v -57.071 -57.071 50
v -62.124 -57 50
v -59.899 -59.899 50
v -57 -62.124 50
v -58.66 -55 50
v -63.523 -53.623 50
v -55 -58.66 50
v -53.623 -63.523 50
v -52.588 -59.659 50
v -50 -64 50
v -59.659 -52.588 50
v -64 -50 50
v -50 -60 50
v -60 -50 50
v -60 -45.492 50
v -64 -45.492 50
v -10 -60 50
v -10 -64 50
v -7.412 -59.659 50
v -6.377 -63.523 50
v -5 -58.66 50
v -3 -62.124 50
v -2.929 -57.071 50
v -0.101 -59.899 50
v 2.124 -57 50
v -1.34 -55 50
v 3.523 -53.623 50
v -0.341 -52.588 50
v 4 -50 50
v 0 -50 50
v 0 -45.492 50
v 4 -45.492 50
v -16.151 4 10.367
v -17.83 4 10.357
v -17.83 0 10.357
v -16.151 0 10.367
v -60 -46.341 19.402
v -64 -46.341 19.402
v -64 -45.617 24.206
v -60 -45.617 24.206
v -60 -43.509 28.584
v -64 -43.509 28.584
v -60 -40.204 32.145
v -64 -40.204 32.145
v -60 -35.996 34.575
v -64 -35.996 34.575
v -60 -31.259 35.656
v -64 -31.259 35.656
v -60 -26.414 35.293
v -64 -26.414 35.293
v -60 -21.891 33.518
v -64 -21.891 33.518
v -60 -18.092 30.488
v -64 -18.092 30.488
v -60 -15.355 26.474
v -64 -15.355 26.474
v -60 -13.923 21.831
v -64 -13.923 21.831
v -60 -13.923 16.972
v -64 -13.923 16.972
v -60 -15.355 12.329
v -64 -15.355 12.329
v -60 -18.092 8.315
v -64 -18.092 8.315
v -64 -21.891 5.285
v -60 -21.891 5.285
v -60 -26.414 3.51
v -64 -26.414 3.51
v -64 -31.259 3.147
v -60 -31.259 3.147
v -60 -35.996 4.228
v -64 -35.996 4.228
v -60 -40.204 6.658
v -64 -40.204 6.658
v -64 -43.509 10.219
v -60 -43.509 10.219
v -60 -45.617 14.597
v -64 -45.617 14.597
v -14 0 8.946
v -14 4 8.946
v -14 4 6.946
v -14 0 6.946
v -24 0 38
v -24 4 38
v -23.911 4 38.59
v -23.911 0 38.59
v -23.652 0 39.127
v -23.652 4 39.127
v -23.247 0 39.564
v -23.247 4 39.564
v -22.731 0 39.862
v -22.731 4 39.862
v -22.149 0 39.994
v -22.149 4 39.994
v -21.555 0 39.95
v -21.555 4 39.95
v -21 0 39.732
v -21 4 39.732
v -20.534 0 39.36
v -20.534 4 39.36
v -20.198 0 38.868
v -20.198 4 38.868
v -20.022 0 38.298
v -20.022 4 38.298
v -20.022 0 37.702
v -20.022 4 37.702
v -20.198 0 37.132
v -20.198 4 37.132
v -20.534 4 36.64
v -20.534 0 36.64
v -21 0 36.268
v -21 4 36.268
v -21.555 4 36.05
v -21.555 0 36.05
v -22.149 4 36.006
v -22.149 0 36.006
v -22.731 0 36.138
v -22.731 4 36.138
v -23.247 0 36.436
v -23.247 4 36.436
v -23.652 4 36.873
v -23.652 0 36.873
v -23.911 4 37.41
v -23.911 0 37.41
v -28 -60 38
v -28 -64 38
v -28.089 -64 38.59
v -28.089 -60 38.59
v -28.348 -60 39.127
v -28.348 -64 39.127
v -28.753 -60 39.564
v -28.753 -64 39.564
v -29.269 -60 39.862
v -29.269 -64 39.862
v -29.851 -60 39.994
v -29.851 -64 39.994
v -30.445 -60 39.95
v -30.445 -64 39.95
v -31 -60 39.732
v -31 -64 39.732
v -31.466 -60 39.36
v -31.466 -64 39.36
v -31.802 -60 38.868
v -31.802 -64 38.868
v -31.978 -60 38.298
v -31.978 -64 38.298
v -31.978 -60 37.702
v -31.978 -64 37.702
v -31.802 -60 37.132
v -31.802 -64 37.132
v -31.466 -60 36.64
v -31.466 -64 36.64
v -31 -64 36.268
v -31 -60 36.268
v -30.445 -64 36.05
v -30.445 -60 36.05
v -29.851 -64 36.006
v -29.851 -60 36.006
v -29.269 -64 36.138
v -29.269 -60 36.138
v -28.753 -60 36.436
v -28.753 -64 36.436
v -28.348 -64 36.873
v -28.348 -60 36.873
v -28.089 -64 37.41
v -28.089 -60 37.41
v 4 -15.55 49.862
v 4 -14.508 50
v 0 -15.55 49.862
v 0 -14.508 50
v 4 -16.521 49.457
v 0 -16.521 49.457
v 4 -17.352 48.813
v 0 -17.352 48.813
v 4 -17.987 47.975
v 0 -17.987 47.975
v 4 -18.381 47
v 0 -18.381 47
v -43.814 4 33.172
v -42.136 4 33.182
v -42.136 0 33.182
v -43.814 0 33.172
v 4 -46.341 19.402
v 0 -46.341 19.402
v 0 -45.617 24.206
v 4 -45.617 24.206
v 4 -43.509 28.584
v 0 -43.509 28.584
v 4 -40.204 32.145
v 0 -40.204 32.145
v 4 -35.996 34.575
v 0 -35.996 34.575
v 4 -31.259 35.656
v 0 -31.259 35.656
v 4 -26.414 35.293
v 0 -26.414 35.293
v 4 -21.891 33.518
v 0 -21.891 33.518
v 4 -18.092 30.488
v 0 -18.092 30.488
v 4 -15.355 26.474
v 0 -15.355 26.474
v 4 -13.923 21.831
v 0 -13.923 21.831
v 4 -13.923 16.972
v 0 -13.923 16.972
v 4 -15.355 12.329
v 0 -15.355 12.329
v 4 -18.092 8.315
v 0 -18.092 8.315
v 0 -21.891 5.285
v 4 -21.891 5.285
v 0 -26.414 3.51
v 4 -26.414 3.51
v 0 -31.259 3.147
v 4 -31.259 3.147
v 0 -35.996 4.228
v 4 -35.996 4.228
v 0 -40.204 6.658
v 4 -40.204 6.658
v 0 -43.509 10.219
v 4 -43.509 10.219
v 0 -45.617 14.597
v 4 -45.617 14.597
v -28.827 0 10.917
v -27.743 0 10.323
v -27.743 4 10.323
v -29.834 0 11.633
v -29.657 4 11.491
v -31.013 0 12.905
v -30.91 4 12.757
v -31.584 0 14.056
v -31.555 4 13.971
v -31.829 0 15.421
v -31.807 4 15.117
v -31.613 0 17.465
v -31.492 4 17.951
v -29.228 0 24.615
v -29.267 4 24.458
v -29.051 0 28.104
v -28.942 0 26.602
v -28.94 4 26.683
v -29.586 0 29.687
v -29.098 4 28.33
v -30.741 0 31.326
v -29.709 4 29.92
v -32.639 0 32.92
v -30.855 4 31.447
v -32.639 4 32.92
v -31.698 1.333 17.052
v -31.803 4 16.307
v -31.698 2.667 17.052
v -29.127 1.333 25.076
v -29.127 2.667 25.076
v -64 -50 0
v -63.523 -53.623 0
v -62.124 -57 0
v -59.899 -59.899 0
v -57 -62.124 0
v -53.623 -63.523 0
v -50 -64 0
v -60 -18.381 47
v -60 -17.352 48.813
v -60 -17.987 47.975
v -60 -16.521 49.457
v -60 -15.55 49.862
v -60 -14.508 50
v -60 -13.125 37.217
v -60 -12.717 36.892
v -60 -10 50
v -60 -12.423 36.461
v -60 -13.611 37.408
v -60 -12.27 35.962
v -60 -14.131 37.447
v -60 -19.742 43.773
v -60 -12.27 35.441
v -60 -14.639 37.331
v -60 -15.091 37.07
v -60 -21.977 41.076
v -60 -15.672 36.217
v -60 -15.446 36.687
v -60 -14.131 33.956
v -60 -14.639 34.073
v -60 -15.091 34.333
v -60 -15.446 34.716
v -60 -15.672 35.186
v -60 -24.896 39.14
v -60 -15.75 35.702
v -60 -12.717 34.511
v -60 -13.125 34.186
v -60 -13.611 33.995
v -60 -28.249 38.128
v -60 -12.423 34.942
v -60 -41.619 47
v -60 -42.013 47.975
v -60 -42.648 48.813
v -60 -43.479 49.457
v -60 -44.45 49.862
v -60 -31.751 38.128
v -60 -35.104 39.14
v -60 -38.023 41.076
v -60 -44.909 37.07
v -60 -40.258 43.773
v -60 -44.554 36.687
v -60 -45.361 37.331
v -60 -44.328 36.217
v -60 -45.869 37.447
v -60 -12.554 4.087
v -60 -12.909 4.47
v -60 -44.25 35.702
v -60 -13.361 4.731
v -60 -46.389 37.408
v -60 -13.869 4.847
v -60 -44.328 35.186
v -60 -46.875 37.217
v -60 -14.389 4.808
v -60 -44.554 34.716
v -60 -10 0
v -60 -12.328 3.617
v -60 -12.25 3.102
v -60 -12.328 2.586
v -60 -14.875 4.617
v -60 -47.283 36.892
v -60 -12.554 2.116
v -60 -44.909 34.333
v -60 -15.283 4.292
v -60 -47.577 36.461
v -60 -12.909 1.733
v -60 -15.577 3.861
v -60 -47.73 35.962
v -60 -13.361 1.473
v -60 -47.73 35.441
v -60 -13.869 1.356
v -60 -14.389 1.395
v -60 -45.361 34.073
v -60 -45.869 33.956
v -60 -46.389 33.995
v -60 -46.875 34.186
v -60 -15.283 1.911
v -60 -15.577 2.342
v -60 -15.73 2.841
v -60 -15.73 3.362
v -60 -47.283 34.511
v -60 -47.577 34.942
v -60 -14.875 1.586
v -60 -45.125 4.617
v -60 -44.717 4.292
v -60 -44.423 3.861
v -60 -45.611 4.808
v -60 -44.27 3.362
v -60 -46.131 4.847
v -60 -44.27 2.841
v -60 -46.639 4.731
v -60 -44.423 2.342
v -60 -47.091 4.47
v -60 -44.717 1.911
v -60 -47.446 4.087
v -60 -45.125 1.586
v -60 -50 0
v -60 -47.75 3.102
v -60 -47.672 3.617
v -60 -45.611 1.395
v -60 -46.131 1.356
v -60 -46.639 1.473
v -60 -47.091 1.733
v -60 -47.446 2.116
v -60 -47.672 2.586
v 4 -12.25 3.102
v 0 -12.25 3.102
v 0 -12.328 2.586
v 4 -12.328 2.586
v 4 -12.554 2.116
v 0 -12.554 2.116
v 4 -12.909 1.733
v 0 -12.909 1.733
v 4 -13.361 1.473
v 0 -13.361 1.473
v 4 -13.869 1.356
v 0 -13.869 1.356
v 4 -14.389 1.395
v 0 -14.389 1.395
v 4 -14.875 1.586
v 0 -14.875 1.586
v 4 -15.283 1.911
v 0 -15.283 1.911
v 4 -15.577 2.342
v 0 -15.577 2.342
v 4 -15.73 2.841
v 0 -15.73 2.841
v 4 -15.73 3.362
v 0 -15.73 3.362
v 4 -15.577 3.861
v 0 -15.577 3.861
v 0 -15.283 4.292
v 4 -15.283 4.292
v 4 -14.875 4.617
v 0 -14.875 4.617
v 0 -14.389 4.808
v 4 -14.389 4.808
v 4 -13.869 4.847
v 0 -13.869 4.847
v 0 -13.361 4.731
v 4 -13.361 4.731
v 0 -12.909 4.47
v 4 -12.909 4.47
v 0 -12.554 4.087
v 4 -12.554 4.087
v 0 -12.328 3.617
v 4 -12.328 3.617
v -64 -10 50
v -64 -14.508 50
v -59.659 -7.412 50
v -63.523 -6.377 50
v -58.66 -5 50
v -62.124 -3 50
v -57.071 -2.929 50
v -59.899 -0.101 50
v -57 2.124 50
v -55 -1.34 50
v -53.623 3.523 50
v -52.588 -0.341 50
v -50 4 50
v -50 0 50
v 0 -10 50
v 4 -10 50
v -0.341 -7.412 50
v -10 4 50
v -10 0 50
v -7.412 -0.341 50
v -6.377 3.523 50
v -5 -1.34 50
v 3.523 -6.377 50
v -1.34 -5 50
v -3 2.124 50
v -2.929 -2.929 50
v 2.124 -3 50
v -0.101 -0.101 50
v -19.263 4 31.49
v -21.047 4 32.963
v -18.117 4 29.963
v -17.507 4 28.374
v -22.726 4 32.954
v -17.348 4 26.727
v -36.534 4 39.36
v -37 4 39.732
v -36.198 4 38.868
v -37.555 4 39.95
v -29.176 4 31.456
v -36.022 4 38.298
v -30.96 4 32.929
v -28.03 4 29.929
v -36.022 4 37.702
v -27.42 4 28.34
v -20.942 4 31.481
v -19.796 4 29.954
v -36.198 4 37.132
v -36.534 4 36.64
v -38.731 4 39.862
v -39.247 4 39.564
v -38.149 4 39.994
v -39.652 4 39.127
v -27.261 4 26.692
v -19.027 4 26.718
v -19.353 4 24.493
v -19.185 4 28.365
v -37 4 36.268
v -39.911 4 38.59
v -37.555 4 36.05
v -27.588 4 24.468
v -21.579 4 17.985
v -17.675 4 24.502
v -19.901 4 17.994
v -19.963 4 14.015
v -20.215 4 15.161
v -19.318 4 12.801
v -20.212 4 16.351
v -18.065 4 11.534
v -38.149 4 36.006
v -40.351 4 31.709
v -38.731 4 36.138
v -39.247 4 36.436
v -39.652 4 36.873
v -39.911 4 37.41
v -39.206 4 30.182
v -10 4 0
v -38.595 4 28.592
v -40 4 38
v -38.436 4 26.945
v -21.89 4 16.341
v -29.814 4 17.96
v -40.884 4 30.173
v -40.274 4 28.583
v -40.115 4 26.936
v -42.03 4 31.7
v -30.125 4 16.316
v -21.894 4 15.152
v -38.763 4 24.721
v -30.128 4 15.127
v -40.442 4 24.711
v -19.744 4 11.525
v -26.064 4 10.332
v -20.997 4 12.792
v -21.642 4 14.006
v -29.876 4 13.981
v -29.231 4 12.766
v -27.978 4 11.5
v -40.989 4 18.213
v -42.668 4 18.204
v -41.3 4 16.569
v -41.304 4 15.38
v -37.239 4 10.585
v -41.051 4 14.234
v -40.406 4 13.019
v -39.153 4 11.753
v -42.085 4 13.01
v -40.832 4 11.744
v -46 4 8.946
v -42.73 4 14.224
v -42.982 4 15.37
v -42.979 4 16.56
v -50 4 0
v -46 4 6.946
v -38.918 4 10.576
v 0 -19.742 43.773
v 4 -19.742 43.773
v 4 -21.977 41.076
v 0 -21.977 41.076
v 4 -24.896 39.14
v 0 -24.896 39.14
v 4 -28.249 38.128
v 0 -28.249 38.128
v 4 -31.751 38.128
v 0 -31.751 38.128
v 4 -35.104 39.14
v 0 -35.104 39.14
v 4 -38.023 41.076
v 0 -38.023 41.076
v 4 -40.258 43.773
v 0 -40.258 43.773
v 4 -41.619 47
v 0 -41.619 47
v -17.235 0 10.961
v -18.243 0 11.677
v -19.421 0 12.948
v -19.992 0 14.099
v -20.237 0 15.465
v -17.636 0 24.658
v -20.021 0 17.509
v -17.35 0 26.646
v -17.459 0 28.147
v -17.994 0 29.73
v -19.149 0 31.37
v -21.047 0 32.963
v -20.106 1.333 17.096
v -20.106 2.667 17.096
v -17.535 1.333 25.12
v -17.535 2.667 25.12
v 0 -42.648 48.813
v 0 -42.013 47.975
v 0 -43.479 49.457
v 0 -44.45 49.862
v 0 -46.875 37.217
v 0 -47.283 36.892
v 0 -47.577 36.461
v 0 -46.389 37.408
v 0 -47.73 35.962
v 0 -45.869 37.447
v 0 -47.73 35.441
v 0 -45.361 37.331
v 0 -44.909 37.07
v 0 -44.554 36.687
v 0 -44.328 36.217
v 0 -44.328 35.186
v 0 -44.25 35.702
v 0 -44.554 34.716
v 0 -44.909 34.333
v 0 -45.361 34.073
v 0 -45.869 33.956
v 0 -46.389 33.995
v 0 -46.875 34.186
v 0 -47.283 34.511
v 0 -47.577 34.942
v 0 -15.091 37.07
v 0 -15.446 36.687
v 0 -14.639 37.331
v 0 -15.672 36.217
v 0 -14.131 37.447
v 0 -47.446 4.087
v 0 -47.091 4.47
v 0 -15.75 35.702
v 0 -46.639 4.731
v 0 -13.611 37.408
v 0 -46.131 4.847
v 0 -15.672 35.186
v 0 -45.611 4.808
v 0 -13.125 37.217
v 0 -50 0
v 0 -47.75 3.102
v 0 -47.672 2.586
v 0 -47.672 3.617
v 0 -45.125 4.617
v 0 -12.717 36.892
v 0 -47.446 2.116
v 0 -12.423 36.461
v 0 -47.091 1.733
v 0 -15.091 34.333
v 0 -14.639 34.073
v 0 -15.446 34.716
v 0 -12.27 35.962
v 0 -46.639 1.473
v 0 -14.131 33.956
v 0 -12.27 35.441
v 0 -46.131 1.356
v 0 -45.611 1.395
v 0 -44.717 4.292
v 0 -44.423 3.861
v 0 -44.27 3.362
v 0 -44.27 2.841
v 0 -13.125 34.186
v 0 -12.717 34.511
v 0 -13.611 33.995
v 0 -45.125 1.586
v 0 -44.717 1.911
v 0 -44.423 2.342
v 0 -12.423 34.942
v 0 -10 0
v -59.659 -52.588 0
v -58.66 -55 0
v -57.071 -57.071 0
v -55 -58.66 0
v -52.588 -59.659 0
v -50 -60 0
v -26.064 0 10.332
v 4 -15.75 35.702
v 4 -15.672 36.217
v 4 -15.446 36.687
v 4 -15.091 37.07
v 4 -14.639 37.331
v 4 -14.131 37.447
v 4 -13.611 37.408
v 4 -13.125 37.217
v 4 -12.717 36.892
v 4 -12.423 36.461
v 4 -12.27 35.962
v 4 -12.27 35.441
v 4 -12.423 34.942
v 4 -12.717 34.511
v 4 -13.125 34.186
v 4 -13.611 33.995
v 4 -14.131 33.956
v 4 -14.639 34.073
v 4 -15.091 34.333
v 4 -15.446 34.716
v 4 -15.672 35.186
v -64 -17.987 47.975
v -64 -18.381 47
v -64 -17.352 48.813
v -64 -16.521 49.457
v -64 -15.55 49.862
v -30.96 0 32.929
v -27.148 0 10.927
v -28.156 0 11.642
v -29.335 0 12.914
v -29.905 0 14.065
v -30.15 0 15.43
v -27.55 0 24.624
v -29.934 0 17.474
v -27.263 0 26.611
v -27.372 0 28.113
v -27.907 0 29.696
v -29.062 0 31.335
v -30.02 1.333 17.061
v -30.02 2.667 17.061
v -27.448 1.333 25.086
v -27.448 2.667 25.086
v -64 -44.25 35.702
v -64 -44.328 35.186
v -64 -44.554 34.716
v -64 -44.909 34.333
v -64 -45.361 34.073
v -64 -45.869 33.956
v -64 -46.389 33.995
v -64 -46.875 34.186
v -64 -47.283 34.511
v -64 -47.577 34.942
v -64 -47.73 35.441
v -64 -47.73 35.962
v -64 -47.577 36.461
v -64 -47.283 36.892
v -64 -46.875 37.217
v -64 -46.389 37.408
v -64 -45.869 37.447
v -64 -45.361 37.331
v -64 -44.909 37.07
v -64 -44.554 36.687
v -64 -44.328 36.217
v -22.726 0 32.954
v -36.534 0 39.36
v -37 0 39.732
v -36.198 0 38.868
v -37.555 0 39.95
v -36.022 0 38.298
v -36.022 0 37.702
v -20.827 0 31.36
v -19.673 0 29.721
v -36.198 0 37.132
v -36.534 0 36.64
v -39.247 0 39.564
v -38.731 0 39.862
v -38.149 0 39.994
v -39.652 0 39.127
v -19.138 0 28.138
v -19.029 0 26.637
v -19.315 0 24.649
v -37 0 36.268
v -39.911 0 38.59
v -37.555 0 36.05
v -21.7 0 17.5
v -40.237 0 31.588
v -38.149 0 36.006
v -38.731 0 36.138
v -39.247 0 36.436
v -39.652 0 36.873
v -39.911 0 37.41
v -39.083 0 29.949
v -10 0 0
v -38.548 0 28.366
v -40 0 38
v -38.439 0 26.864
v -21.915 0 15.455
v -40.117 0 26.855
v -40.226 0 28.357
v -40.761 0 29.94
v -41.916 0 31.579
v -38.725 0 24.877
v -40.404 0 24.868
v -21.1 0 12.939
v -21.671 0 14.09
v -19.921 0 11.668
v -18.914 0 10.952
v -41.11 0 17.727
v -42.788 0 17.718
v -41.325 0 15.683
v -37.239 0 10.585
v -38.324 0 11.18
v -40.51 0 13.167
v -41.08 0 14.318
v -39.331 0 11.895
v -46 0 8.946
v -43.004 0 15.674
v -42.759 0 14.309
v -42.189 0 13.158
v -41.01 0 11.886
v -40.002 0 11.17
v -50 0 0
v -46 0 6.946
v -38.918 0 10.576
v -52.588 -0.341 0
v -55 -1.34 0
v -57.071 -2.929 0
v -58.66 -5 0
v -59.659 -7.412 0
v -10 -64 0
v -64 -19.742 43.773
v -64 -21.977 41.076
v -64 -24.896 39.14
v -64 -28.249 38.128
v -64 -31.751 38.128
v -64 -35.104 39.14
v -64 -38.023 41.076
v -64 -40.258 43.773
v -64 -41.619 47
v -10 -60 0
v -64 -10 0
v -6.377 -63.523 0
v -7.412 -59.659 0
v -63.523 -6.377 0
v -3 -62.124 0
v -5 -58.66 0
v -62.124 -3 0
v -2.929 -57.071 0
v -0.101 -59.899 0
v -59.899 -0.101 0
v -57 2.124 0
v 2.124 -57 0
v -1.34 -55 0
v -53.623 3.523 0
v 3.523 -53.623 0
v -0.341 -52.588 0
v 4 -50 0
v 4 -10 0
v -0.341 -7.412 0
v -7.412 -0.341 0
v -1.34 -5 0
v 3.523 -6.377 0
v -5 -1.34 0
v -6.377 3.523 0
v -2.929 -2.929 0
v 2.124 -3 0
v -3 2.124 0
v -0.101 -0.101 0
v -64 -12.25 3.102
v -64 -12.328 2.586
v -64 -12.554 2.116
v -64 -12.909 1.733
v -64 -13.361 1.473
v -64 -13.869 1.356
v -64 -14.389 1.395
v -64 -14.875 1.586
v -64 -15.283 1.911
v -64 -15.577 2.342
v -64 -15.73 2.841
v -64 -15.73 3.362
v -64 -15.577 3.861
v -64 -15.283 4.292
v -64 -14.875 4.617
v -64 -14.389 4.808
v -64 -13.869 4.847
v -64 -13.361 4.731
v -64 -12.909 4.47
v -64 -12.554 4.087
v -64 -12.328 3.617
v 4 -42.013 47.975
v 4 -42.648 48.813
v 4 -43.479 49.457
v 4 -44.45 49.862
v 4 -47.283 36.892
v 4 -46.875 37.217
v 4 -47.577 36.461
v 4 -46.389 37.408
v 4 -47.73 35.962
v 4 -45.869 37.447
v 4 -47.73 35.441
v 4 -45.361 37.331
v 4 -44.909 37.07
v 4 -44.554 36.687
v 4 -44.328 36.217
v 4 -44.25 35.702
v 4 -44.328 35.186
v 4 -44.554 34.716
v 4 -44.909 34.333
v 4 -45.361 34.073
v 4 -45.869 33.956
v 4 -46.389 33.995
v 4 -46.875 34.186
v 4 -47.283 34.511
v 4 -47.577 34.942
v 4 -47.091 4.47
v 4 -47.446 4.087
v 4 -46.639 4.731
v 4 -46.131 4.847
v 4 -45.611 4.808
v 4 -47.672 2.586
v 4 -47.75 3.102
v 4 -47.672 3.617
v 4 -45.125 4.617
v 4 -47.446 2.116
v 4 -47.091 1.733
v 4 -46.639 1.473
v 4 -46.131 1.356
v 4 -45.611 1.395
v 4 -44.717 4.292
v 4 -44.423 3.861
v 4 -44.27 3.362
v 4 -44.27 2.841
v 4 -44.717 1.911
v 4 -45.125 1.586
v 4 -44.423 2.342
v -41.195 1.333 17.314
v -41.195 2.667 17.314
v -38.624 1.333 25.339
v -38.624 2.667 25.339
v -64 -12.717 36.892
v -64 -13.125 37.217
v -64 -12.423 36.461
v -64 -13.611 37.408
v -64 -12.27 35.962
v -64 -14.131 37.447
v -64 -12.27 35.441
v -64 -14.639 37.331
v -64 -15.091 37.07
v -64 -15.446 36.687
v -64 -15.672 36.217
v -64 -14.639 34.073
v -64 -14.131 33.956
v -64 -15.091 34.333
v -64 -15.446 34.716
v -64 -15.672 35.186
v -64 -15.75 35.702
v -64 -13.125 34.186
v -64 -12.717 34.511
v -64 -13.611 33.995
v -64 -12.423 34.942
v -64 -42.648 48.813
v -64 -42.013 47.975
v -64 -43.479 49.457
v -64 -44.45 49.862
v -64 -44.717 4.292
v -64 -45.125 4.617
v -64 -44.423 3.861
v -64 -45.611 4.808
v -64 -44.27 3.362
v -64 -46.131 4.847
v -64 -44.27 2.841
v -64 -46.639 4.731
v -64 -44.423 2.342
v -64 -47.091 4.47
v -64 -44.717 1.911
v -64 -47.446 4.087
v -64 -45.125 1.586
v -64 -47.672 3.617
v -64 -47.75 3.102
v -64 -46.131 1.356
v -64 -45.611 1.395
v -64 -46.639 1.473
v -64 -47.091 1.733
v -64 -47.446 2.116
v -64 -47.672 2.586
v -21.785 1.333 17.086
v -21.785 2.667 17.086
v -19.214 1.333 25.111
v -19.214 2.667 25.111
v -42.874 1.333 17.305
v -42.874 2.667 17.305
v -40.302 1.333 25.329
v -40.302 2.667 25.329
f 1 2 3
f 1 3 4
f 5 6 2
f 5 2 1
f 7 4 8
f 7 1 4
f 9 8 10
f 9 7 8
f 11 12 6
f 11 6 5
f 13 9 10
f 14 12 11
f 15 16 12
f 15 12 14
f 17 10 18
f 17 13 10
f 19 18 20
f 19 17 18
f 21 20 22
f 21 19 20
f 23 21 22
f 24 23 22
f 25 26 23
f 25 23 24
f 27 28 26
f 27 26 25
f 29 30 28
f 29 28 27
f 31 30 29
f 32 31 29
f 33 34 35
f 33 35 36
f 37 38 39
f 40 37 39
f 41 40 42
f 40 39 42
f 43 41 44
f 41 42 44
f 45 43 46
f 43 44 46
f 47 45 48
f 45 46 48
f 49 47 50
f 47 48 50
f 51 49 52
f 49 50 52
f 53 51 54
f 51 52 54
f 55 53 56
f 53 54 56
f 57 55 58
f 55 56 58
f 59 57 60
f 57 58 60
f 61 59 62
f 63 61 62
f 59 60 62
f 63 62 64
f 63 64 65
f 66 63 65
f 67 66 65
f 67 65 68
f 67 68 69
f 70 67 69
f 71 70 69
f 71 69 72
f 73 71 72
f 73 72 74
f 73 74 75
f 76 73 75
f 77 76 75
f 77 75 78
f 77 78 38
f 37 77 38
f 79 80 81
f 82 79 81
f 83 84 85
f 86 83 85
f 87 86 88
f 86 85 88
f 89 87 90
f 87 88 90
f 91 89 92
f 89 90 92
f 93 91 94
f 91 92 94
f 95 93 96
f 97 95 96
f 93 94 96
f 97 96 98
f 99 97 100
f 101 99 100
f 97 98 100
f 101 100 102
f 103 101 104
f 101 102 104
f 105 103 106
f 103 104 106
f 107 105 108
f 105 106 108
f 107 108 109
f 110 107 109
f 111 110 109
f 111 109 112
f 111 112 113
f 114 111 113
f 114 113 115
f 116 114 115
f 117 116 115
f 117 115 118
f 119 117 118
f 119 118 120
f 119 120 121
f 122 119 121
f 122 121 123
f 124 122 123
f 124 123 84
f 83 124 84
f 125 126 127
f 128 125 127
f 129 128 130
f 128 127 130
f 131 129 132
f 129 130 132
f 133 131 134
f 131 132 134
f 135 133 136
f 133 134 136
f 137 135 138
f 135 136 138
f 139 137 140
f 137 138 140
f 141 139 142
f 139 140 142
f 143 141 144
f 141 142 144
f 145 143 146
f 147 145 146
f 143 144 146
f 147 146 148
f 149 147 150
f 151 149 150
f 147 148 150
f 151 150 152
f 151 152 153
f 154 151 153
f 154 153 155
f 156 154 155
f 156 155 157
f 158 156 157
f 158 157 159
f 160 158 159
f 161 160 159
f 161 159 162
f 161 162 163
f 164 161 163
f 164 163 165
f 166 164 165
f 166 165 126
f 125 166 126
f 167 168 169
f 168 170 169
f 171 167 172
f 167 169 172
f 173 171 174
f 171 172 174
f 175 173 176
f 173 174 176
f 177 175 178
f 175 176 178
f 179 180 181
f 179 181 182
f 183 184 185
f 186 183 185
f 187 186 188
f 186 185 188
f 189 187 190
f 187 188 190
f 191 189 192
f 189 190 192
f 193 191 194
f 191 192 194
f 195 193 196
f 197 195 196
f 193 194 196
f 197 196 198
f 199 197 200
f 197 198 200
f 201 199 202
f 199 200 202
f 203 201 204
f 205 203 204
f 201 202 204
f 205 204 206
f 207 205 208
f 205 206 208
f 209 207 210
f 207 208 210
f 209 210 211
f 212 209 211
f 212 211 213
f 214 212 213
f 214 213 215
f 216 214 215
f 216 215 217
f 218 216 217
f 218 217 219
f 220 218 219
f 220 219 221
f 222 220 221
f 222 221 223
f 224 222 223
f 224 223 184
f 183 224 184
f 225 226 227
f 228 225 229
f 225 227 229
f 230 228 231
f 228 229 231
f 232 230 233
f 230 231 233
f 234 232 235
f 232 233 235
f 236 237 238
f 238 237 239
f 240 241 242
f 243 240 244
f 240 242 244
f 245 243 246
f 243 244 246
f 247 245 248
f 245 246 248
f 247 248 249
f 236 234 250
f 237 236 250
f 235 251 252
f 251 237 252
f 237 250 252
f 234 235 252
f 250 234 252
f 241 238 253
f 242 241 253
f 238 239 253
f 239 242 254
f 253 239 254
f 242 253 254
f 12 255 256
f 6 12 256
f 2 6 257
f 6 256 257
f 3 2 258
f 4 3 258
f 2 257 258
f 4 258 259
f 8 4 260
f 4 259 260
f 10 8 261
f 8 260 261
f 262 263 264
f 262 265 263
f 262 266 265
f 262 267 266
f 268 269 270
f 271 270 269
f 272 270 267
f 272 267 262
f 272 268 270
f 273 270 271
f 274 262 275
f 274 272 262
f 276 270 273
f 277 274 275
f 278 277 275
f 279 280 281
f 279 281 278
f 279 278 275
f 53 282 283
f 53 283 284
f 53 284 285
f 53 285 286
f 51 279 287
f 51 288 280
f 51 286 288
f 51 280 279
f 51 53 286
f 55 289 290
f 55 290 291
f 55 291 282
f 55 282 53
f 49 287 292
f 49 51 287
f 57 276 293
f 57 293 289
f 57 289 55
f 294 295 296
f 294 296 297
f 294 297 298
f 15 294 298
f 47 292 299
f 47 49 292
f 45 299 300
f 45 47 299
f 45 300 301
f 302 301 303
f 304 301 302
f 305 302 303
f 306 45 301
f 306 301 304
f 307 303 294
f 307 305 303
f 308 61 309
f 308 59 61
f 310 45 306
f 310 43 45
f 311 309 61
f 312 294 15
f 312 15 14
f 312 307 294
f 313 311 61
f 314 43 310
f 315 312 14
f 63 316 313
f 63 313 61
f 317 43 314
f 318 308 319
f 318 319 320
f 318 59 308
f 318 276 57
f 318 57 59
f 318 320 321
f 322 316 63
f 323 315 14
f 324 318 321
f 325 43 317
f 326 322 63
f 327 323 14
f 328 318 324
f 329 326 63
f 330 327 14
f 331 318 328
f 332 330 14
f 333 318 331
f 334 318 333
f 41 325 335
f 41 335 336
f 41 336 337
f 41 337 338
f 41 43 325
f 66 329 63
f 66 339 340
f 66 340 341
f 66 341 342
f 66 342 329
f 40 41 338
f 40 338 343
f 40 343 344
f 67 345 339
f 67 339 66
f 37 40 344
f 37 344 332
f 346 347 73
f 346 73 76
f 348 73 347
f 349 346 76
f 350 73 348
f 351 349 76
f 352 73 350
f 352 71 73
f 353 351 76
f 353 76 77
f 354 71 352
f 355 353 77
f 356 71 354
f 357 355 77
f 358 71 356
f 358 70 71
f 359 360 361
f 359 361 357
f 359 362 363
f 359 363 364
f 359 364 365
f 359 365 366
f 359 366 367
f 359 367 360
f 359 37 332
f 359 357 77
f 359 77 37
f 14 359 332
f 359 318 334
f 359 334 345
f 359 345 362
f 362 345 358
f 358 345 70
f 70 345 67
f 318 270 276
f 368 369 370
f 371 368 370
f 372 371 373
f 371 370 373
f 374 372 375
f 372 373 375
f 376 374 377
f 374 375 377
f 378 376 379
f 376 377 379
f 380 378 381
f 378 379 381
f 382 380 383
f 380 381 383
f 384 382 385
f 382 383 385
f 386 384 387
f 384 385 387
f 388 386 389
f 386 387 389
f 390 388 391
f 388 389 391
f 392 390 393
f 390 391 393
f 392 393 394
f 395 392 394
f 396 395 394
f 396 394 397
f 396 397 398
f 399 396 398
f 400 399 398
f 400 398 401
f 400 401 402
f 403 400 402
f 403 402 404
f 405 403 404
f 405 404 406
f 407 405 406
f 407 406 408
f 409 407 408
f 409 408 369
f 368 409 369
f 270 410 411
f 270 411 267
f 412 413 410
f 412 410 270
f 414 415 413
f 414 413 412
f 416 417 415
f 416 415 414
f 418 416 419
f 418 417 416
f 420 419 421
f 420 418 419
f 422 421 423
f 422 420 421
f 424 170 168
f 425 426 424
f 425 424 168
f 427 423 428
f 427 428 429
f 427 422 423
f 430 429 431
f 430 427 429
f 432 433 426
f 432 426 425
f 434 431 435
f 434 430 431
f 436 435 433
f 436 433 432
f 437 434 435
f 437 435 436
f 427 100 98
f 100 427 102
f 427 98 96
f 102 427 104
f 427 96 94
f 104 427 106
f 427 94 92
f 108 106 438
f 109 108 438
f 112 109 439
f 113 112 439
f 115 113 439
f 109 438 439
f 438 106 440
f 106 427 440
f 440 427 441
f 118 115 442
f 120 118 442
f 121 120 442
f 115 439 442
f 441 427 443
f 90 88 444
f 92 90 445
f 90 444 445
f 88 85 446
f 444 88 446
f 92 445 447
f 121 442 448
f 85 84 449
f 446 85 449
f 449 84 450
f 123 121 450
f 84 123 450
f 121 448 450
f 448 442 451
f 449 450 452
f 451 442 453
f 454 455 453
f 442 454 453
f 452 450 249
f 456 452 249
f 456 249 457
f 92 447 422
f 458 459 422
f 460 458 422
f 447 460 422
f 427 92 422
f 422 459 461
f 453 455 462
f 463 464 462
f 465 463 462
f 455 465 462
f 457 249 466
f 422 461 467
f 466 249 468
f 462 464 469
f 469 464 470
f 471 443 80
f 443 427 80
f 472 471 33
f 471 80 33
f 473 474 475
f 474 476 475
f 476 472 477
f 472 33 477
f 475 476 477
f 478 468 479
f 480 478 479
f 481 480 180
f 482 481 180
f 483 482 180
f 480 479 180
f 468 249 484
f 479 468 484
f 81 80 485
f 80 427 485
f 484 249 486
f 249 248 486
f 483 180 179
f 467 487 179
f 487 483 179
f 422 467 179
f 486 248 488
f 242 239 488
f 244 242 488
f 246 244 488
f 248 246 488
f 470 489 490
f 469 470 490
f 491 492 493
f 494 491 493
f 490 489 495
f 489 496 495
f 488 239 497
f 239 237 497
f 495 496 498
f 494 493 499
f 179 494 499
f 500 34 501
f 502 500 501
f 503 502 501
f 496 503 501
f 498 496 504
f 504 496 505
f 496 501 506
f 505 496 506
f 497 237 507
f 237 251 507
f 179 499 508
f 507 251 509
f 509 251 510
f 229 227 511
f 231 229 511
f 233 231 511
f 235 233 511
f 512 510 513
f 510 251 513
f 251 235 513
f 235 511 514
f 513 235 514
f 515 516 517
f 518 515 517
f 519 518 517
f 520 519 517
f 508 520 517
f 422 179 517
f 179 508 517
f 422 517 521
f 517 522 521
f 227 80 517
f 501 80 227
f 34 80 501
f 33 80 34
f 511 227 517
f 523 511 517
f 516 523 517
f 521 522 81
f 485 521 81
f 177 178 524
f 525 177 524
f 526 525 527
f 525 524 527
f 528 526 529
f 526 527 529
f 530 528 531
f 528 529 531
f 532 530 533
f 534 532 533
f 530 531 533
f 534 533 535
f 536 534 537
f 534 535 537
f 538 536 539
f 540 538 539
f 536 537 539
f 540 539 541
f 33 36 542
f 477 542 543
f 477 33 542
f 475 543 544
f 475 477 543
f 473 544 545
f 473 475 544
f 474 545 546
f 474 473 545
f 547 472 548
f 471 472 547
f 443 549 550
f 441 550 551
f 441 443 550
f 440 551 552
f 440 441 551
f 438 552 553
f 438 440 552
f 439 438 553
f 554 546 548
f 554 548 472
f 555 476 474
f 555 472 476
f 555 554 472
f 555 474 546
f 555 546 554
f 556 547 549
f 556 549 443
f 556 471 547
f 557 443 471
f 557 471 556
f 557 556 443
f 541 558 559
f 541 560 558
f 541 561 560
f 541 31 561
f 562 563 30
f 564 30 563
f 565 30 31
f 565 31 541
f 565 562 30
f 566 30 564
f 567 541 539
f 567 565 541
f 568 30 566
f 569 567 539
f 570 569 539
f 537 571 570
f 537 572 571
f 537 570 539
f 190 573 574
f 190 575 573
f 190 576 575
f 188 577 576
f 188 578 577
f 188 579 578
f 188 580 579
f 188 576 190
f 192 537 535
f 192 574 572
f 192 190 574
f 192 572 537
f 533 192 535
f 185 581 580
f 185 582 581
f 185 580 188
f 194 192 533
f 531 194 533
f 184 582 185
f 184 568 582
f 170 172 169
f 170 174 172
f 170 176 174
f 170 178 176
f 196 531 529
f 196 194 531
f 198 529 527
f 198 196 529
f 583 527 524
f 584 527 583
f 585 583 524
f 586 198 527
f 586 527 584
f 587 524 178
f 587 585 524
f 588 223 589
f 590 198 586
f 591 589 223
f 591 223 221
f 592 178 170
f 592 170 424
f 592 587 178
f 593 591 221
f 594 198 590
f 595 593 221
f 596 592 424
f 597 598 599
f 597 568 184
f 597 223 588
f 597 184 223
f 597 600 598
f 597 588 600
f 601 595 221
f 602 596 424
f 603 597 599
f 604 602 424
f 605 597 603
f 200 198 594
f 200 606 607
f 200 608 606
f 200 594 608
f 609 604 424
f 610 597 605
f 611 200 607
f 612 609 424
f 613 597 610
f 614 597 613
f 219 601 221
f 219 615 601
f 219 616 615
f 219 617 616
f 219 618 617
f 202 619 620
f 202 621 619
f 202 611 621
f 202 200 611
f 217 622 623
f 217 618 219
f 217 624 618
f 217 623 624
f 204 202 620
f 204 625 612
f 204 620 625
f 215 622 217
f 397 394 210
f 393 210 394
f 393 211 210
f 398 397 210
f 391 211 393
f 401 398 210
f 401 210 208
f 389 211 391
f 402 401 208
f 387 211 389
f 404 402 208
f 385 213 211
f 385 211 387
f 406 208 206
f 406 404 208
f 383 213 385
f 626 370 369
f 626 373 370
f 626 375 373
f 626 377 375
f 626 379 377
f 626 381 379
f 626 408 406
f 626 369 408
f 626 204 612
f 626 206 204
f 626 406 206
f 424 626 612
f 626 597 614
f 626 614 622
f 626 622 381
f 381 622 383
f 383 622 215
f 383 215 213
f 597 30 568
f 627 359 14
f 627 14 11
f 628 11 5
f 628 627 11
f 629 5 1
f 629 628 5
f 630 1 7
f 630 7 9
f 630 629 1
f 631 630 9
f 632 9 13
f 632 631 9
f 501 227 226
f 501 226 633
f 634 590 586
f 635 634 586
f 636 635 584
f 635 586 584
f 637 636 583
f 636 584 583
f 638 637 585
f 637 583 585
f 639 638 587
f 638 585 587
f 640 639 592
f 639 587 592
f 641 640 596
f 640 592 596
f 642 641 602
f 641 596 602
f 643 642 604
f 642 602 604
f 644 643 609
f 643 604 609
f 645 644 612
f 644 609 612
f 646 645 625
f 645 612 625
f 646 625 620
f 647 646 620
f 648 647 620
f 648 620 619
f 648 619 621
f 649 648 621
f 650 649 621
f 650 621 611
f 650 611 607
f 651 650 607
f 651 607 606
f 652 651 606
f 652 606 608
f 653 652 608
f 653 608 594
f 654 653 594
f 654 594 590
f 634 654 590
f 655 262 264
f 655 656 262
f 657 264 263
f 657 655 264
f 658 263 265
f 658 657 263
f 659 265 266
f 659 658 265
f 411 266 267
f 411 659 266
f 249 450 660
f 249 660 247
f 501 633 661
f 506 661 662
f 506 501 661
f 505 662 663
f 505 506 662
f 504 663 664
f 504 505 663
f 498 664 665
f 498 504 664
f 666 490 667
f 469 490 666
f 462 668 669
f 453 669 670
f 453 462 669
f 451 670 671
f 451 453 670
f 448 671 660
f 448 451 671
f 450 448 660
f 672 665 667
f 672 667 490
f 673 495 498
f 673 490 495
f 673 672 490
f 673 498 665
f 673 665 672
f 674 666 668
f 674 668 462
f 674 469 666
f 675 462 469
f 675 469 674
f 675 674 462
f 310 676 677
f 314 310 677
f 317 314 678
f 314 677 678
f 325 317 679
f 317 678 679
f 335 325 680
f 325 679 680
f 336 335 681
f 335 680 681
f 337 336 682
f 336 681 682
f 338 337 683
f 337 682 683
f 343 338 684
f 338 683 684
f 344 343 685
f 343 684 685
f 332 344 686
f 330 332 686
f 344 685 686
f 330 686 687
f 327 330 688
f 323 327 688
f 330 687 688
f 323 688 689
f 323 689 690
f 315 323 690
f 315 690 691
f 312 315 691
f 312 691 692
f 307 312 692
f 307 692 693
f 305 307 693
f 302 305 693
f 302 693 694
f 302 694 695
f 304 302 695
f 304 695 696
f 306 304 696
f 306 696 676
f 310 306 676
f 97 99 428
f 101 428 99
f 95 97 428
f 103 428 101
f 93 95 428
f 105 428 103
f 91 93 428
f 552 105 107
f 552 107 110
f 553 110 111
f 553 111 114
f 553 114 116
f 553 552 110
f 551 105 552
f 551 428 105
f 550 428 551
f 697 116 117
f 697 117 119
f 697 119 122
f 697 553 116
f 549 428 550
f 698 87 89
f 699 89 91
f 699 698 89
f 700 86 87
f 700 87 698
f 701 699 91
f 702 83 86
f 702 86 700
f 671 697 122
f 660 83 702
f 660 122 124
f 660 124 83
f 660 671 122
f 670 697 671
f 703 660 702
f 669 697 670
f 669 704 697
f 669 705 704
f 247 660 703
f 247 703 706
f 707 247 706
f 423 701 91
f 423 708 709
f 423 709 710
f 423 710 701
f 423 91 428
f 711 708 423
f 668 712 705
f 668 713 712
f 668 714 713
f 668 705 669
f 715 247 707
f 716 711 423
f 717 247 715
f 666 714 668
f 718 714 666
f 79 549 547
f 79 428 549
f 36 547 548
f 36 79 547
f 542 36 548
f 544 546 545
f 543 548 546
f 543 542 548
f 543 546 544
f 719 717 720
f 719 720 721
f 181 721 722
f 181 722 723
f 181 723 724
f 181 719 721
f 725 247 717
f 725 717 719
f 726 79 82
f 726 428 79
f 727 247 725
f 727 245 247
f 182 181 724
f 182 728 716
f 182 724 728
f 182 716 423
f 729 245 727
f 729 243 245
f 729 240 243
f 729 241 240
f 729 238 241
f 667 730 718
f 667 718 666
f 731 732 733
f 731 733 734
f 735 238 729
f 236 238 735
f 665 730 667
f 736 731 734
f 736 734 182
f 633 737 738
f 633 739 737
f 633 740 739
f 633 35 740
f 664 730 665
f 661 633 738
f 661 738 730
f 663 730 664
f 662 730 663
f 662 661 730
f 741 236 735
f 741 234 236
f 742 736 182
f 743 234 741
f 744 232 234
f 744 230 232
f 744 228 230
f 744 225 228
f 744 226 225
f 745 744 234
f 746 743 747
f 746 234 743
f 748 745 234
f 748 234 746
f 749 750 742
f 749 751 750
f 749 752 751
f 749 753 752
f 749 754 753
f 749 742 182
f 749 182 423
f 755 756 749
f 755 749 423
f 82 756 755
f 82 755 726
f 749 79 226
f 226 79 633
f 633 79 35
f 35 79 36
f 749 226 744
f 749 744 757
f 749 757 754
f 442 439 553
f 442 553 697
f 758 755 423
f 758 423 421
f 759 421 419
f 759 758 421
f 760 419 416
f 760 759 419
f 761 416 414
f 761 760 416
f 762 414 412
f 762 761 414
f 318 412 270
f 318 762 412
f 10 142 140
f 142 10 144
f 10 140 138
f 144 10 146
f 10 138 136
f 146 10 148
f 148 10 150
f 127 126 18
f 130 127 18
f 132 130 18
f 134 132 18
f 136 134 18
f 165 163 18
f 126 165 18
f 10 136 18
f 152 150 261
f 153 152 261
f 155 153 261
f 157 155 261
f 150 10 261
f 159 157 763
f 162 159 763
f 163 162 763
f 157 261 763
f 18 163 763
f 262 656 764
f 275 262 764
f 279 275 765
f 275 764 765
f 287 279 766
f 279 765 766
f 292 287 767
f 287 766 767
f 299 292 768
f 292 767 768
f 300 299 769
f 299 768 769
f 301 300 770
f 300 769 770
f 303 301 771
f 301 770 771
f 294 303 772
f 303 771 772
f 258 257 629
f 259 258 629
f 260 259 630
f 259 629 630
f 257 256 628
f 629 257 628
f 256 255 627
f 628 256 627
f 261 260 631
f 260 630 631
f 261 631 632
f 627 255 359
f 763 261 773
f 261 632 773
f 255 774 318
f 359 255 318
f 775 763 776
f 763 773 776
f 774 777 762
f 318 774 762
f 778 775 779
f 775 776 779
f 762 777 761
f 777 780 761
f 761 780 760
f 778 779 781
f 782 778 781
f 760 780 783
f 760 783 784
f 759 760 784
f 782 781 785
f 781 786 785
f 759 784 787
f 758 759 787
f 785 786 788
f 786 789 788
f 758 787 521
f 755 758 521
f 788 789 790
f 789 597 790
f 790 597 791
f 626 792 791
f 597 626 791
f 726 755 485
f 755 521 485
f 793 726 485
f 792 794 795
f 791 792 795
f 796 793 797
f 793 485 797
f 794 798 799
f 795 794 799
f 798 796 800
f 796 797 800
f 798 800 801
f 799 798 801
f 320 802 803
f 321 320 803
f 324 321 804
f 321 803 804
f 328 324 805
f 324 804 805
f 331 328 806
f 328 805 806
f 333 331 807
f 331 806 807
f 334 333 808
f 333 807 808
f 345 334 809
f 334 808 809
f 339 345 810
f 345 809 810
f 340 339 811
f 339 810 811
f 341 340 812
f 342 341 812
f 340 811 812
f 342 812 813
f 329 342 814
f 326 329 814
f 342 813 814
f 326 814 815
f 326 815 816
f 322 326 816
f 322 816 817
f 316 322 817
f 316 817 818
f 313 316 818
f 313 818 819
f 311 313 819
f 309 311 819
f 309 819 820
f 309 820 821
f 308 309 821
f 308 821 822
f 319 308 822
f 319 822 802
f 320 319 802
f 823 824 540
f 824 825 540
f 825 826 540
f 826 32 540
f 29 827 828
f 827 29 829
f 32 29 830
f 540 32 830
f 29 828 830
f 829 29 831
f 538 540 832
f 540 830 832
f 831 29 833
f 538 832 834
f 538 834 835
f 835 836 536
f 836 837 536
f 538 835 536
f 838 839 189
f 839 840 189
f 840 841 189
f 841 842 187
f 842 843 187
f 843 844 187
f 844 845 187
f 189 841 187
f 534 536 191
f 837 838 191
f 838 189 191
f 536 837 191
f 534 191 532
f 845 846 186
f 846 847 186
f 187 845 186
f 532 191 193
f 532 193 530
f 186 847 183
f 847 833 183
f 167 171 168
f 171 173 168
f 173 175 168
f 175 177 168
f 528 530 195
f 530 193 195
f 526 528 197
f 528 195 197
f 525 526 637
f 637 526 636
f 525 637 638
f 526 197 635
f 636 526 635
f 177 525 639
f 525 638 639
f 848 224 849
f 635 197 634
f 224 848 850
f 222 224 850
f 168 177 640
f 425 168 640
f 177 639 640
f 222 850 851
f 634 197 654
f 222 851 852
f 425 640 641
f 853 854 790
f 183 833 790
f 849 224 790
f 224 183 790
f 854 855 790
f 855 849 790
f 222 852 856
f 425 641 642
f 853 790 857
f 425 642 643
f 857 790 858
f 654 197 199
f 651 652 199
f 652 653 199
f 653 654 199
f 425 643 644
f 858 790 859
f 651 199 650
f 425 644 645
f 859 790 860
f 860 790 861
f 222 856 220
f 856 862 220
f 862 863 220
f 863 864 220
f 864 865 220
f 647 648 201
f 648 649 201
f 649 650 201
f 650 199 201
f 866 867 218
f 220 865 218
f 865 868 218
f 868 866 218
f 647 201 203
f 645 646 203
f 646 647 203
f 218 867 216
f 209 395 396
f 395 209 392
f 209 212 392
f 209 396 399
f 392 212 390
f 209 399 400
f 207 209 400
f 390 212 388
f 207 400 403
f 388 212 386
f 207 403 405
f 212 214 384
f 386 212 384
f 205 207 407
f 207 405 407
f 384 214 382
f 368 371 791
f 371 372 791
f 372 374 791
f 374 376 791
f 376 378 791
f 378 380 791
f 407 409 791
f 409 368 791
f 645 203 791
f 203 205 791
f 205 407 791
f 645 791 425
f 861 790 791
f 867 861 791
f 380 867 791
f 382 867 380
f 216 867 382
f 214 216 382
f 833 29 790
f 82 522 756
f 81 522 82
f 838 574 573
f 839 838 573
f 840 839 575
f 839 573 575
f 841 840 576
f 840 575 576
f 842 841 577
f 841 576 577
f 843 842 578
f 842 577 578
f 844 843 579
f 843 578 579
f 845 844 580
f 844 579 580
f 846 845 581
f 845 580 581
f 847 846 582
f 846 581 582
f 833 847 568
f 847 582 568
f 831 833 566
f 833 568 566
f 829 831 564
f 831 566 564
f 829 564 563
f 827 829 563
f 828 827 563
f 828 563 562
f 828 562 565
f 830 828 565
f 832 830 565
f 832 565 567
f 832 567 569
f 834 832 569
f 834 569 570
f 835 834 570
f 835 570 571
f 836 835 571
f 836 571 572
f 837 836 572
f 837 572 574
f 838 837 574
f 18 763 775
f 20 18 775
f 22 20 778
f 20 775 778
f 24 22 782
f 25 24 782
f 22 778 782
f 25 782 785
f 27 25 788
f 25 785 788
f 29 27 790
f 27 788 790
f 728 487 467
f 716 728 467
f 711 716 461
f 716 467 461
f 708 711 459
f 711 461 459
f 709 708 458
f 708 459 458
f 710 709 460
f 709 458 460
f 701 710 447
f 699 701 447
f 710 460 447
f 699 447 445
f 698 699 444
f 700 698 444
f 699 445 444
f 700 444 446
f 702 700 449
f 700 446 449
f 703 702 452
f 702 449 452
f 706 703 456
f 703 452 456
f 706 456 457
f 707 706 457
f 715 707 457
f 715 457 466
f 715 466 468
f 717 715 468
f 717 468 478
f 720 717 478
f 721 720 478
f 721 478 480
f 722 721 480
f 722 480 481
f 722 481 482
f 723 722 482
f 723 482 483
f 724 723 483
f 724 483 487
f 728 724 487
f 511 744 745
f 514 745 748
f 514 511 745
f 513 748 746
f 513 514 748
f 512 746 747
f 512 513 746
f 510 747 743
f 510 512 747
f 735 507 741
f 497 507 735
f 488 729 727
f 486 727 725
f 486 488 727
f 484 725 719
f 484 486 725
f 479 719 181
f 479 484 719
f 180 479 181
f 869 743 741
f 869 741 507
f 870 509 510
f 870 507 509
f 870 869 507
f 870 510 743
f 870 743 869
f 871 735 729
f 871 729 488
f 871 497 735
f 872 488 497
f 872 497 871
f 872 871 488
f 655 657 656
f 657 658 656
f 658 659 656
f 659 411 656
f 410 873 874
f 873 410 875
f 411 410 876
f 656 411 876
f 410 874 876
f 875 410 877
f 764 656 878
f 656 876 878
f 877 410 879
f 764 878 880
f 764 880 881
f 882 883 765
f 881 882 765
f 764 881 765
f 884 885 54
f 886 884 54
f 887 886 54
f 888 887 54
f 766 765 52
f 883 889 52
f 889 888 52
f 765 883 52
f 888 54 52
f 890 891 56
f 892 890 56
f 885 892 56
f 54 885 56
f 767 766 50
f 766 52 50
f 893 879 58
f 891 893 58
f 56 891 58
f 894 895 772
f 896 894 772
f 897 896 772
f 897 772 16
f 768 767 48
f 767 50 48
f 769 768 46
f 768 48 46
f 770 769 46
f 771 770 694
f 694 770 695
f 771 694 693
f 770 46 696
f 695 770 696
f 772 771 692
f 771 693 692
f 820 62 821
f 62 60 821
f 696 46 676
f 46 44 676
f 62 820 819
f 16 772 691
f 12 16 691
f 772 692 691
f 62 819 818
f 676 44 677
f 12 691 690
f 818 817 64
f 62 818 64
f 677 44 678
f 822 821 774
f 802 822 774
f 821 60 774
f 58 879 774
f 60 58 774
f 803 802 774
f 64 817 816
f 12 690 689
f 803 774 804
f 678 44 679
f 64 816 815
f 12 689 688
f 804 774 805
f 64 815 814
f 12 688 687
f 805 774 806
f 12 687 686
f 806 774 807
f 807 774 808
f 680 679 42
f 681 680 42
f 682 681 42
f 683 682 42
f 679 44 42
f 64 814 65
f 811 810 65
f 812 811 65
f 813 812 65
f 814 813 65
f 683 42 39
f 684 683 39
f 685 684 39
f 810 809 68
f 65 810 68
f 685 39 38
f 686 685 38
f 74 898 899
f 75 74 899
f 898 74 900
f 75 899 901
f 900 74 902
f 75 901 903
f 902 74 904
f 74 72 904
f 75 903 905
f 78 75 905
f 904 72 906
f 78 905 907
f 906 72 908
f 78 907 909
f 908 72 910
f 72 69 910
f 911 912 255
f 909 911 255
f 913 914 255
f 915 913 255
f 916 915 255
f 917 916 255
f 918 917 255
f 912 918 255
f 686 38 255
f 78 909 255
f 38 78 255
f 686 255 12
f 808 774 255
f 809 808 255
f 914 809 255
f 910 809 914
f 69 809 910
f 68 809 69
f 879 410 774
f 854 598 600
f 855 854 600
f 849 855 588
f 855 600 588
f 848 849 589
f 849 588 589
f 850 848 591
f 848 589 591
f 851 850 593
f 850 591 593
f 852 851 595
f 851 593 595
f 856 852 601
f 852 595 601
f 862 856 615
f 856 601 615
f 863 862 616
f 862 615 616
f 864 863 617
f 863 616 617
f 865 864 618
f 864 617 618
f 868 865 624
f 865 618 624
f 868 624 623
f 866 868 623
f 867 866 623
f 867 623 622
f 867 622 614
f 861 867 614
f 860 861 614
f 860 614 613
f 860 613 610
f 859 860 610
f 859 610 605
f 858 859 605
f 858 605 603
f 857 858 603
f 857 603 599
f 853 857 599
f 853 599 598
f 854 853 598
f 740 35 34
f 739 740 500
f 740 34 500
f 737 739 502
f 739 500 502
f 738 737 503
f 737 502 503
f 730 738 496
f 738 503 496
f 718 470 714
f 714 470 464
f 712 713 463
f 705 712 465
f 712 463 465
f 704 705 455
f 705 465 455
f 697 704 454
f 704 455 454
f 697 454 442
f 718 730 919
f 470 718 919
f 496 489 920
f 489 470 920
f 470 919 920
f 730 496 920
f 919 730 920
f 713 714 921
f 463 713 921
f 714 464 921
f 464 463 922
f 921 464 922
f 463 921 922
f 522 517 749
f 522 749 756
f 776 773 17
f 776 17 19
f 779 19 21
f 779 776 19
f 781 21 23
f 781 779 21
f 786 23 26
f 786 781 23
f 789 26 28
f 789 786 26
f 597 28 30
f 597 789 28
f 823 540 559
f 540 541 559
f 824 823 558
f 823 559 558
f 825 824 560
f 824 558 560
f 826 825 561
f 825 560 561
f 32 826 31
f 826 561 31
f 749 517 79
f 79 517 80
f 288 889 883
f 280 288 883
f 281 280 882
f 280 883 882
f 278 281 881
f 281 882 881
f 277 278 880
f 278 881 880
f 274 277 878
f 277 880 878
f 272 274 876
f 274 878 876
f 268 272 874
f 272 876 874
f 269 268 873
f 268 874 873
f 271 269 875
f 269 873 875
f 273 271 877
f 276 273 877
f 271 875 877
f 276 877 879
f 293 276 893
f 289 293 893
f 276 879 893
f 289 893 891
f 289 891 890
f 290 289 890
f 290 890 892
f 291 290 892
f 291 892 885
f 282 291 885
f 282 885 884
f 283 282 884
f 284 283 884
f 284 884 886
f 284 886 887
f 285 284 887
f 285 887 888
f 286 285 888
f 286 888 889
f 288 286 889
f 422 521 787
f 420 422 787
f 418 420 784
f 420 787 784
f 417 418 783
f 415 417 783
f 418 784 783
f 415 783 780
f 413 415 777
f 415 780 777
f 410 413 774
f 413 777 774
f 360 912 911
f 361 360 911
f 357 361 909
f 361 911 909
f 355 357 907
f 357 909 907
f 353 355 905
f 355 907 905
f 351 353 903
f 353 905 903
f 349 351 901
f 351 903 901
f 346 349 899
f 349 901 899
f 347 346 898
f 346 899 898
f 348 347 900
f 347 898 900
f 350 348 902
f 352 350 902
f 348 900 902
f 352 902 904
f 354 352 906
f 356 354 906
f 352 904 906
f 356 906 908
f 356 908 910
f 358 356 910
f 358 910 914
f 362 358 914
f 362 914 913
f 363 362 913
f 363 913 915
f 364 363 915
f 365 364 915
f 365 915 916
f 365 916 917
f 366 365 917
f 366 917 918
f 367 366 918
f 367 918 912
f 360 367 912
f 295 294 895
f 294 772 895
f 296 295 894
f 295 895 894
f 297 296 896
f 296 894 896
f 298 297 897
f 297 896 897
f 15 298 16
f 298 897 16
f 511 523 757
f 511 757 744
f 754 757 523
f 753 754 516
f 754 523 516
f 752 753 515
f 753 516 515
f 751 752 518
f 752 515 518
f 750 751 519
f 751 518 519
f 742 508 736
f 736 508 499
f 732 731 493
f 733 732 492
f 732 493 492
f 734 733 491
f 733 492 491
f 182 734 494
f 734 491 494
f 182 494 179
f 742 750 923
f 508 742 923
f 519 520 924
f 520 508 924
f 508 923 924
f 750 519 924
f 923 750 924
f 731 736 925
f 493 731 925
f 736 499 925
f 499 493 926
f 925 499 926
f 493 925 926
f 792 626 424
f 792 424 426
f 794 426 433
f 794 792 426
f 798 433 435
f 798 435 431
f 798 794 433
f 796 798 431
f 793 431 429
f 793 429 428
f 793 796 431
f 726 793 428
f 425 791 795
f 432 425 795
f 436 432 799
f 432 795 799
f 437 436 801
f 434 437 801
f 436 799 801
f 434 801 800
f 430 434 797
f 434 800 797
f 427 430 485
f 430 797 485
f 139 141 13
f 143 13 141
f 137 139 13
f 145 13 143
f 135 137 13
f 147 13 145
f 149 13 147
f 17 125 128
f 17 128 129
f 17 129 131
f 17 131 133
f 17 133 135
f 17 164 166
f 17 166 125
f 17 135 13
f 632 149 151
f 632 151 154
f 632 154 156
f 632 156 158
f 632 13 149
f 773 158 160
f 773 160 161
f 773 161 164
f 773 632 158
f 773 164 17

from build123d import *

# Parameters (mm, degrees)
ESTRUSIONE_SOTTILE1_DEPTH = 50
SCHIZZO2_R                = 2
TAGLIO_ESTRUSIONE1_DEPTH  = 10
SCHIZZO3_R                = 12
TAGLIO_ESTRUSIONE2_DEPTH  = 68
RACCORDO1_R               = 4
RACCORDO2_R               = 4
RACCORDO3_R               = 4
RACCORDO4_R               = 4
SCHIZZO4_R                = 2
TAGLIO_ESTRUSIONE3_DEPTH  = 10
SCHIZZO5_W                = 32
SCHIZZO5_H                = 2
TAGLIO_ESTRUSIONE4_DEPTH  = 10
TAGLIO_ESTRUSIONE6_REACH  = 107.925
SCHIZZO8_R                = 16.3
TAGLIO_ESTRUSIONE5_REACH  = 107.925
SCHIZZO7_R                = 1.75


with BuildPart() as part:
    # Schizzo1 → Estrusione-Sottile1 (new body)
    with BuildSketch(Plane.XY):
        with BuildLine():
            Line((-64, -10), (-64, -50))
            ThreePointArc((-64, -50), (-59.899494937, -59.899494937), (-50, -64))
            Line((-50, -64), (-10, -64))
            ThreePointArc((-10, -64), (-0.100505063, -59.899494937), (4, -50))
            Line((4, -50), (4, -10))
            ThreePointArc((4, -10), (-0.100505063, -0.100505063), (-10, 4))
            Line((-10, 4), (-50, 4))
            ThreePointArc((-50, 4), (-59.899494937, -0.100505063), (-64, -10))
        make_face()
        with BuildLine():
            Line((-60, -10), (-60, -50))
            ThreePointArc((-60, -50), (-57.071067812, -57.071067812), (-50, -60))
            Line((-50, -60), (-10, -60))
            ThreePointArc((-10, -60), (-2.928932188, -57.071067812), (0, -50))
            Line((0, -50), (0, -10))
            ThreePointArc((0, -10), (-2.928932188, -2.928932188), (-10, 0))
            Line((-10, 0), (-50, 0))
            ThreePointArc((-50, 0), (-57.071067812, -2.928932188), (-60, -10))
        make_face(mode=Mode.SUBTRACT)
    extrude(amount=ESTRUSIONE_SOTTILE1_DEPTH)

    # Schizzo2 → Taglio-Estrusione1 (cut)
    with BuildSketch(Plane(origin=(0, 4, 0), x_dir=(1, 0, 0), z_dir=(0, 1, 0))):
        with Locations(Location((-38, -38, 0), (0, 0, 180))):
            Circle(SCHIZZO2_R)
        with Locations(Location((-22, -38, 0), (0, 0, 180))):
            Circle(SCHIZZO2_R)
    extrude(amount=-TAGLIO_ESTRUSIONE1_DEPTH, mode=Mode.SUBTRACT)

    # Schizzo3 → Taglio-Estrusione2 (cut)
    with BuildSketch(Plane.ZY.offset(64)):
        with Locations((50, -30)):
            Circle(SCHIZZO3_R)
    extrude(amount=-TAGLIO_ESTRUSIONE2_DEPTH, mode=Mode.SUBTRACT)

    # Raccordo1
    raccordo1_edges = [part.edges().sort_by_distance(p)[0] for p in [
        (-62, -18, 50),
    ]]
    fillet(raccordo1_edges, radius=RACCORDO1_R)

    # Raccordo2
    raccordo2_edges = [part.edges().sort_by_distance(p)[0] for p in [
        (-62, -42, 50),
    ]]
    fillet(raccordo2_edges, radius=RACCORDO2_R)

    # Raccordo3
    raccordo3_edges = [part.edges().sort_by_distance(p)[0] for p in [
        (2, -18, 50),
    ]]
    fillet(raccordo3_edges, radius=RACCORDO3_R)

    # Raccordo4
    raccordo4_edges = [part.edges().sort_by_distance(p)[0] for p in [
        (2, -42, 50),
    ]]
    fillet(raccordo4_edges, radius=RACCORDO4_R)

    # Schizzo4 → Taglio-Estrusione3 (cut)
    with BuildSketch(Plane.XZ.offset(64)):
        with Locations((-30, 38)):
            Circle(SCHIZZO4_R)
    extrude(amount=-TAGLIO_ESTRUSIONE3_DEPTH, mode=Mode.SUBTRACT)

    # Schizzo5 → Taglio-Estrusione4 (cut)
    with BuildSketch(Plane(origin=(0, 4, 0), x_dir=(1, 0, 0), z_dir=(0, 1, 0))):
        with Locations((-30, -7.945849316)):
            Rectangle(SCHIZZO5_W, SCHIZZO5_H)
        with BuildLine():
            Line((-30.960454742, -32.928721256), (-32.639127219, -32.919533938))
            add(Edge.make_bspline(
                [(-27.742758505, -10.323050859), (-39.164938897, -15.912155443), (-21.882006837, -25.659406976), (-32.639127219, -32.919533938)],
                knots=[0, 0, 0, 0, 1, 1, 1, 1], degree=3))
            Line((-27.742758505, -10.323050859), (-26.064086029, -10.332238178))
            add(Edge.make_bspline(
                [(-26.064086029, -10.332238178), (-37.486266421, -15.921342761), (-20.203334361, -25.668594294), (-30.960454742, -32.928721256)],
                knots=[0, 0, 0, 0, 1, 1, 1, 1], degree=3))
        make_face()
        with BuildLine():
            Line((-42.135720019, -33.181656302), (-43.814392495, -33.172468983))
            add(Edge.make_bspline(
                [(-38.918023781, -10.575985905), (-50.340204173, -16.165090488), (-33.057272113, -25.912342021), (-43.814392495, -33.172468983)],
                knots=[0, 0, 0, 0, 1, 1, 1, 1], degree=3))
            Line((-38.918023781, -10.575985905), (-37.239351305, -10.585173223))
            add(Edge.make_bspline(
                [(-37.239351305, -10.585173223), (-48.661531697, -16.174277806), (-31.378599637, -25.921529339), (-42.135720019, -33.181656302)],
                knots=[0, 0, 0, 0, 1, 1, 1, 1], degree=3))
        make_face()
        with BuildLine():
            Line((-21.047266541, -32.963061307), (-22.725939017, -32.953873989))
            add(Edge.make_bspline(
                [(-17.829570303, -10.35739091), (-29.251750695, -15.946495494), (-11.968818635, -25.693747027), (-22.725939017, -32.953873989)],
                knots=[0, 0, 0, 0, 1, 1, 1, 1], degree=3))
            Line((-17.829570303, -10.35739091), (-16.150897827, -10.366578228))
            add(Edge.make_bspline(
                [(-16.150897827, -10.366578228), (-27.573078219, -15.955682812), (-10.290146159, -25.702934345), (-21.047266541, -32.963061307)],
                knots=[0, 0, 0, 0, 1, 1, 1, 1], degree=3))
        make_face()
    extrude(amount=-TAGLIO_ESTRUSIONE4_DEPTH, mode=Mode.SUBTRACT)

    # Taglio-Estrusione6: up to this face of the body (flat: up to its plane)
    taglio_estrusione6_end = Plane(part.part.faces().sort_by_distance((4, -30, 22.393243333))[0])
    # Schizzo8 → Taglio-Estrusione6 (cut, up to the picked face)
    with BuildSketch(Plane.ZY.offset(64), mode=Mode.PRIVATE) as taglio_estrusione6_sk1:
        with Locations(Location((19.401575039, -30.040864416, 0), (0, 0, 270))):
            Circle(SCHIZZO8_R)
    taglio_estrusione6_tool1 = split(extrude(taglio_estrusione6_sk1.sketch, amount=-TAGLIO_ESTRUSIONE6_REACH, mode=Mode.PRIVATE), bisect_by=taglio_estrusione6_end, keep=Keep.BOTH, mode=Mode.PRIVATE)
    add(taglio_estrusione6_tool1.solids().sort_by(Axis((-64, -30.040864, 19.401575), (1, 0, 0)))[0], mode=Mode.SUBTRACT)

    # Taglio-Estrusione5: up to this face of the body (flat: up to its plane)
    taglio_estrusione5_end = Plane(part.part.faces().sort_by_distance((4, -30, 37.359687576))[0])
    # Schizzo7 → Taglio-Estrusione5 (cut, up to the picked face)
    with BuildSketch(Plane.ZY.offset(64), mode=Mode.PRIVATE) as taglio_estrusione5_sk1:
        with Locations(Location((35.701575039, -14, 0), (0, 0, 270))):
            Circle(SCHIZZO7_R)
    taglio_estrusione5_tool1 = split(extrude(taglio_estrusione5_sk1.sketch, amount=-TAGLIO_ESTRUSIONE5_REACH, mode=Mode.PRIVATE), bisect_by=taglio_estrusione5_end, keep=Keep.BOTH, mode=Mode.PRIVATE)
    # Schizzo7 → Taglio-Estrusione5 (cut, up to the picked face)
    with BuildSketch(Plane.ZY.offset(64), mode=Mode.PRIVATE) as taglio_estrusione5_sk2:
        with Locations(Location((35.701575039, -46, 0), (0, 0, 90))):
            Circle(SCHIZZO7_R)
    taglio_estrusione5_tool2 = split(extrude(taglio_estrusione5_sk2.sketch, amount=-TAGLIO_ESTRUSIONE5_REACH, mode=Mode.PRIVATE), bisect_by=taglio_estrusione5_end, keep=Keep.BOTH, mode=Mode.PRIVATE)
    # Schizzo7 → Taglio-Estrusione5 (cut, up to the picked face)
    with BuildSketch(Plane.ZY.offset(64), mode=Mode.PRIVATE) as taglio_estrusione5_sk3:
        with Locations(Location((3.101575039, -46, 0), (0, 0, 270))):
            Circle(SCHIZZO7_R)
    taglio_estrusione5_tool3 = split(extrude(taglio_estrusione5_sk3.sketch, amount=-TAGLIO_ESTRUSIONE5_REACH, mode=Mode.PRIVATE), bisect_by=taglio_estrusione5_end, keep=Keep.BOTH, mode=Mode.PRIVATE)
    # Schizzo7 → Taglio-Estrusione5 (cut, up to the picked face)
    with BuildSketch(Plane.ZY.offset(64), mode=Mode.PRIVATE) as taglio_estrusione5_sk4:
        with Locations(Location((3.101575039, -14, 0), (0, 0, 90))):
            Circle(SCHIZZO7_R)
    taglio_estrusione5_tool4 = split(extrude(taglio_estrusione5_sk4.sketch, amount=-TAGLIO_ESTRUSIONE5_REACH, mode=Mode.PRIVATE), bisect_by=taglio_estrusione5_end, keep=Keep.BOTH, mode=Mode.PRIVATE)
    add(taglio_estrusione5_tool1.solids().sort_by(Axis((-64, -14, 35.701575), (1, 0, 0)))[0], mode=Mode.SUBTRACT)
    add(taglio_estrusione5_tool2.solids().sort_by(Axis((-64, -46, 35.701575), (1, 0, 0)))[0], mode=Mode.SUBTRACT)
    add(taglio_estrusione5_tool3.solids().sort_by(Axis((-64, -46, 3.101575), (1, 0, 0)))[0], mode=Mode.SUBTRACT)
    add(taglio_estrusione5_tool4.solids().sort_by(Axis((-64, -14, 3.101575), (1, 0, 0)))[0], mode=Mode.SUBTRACT)


solid = part.part
